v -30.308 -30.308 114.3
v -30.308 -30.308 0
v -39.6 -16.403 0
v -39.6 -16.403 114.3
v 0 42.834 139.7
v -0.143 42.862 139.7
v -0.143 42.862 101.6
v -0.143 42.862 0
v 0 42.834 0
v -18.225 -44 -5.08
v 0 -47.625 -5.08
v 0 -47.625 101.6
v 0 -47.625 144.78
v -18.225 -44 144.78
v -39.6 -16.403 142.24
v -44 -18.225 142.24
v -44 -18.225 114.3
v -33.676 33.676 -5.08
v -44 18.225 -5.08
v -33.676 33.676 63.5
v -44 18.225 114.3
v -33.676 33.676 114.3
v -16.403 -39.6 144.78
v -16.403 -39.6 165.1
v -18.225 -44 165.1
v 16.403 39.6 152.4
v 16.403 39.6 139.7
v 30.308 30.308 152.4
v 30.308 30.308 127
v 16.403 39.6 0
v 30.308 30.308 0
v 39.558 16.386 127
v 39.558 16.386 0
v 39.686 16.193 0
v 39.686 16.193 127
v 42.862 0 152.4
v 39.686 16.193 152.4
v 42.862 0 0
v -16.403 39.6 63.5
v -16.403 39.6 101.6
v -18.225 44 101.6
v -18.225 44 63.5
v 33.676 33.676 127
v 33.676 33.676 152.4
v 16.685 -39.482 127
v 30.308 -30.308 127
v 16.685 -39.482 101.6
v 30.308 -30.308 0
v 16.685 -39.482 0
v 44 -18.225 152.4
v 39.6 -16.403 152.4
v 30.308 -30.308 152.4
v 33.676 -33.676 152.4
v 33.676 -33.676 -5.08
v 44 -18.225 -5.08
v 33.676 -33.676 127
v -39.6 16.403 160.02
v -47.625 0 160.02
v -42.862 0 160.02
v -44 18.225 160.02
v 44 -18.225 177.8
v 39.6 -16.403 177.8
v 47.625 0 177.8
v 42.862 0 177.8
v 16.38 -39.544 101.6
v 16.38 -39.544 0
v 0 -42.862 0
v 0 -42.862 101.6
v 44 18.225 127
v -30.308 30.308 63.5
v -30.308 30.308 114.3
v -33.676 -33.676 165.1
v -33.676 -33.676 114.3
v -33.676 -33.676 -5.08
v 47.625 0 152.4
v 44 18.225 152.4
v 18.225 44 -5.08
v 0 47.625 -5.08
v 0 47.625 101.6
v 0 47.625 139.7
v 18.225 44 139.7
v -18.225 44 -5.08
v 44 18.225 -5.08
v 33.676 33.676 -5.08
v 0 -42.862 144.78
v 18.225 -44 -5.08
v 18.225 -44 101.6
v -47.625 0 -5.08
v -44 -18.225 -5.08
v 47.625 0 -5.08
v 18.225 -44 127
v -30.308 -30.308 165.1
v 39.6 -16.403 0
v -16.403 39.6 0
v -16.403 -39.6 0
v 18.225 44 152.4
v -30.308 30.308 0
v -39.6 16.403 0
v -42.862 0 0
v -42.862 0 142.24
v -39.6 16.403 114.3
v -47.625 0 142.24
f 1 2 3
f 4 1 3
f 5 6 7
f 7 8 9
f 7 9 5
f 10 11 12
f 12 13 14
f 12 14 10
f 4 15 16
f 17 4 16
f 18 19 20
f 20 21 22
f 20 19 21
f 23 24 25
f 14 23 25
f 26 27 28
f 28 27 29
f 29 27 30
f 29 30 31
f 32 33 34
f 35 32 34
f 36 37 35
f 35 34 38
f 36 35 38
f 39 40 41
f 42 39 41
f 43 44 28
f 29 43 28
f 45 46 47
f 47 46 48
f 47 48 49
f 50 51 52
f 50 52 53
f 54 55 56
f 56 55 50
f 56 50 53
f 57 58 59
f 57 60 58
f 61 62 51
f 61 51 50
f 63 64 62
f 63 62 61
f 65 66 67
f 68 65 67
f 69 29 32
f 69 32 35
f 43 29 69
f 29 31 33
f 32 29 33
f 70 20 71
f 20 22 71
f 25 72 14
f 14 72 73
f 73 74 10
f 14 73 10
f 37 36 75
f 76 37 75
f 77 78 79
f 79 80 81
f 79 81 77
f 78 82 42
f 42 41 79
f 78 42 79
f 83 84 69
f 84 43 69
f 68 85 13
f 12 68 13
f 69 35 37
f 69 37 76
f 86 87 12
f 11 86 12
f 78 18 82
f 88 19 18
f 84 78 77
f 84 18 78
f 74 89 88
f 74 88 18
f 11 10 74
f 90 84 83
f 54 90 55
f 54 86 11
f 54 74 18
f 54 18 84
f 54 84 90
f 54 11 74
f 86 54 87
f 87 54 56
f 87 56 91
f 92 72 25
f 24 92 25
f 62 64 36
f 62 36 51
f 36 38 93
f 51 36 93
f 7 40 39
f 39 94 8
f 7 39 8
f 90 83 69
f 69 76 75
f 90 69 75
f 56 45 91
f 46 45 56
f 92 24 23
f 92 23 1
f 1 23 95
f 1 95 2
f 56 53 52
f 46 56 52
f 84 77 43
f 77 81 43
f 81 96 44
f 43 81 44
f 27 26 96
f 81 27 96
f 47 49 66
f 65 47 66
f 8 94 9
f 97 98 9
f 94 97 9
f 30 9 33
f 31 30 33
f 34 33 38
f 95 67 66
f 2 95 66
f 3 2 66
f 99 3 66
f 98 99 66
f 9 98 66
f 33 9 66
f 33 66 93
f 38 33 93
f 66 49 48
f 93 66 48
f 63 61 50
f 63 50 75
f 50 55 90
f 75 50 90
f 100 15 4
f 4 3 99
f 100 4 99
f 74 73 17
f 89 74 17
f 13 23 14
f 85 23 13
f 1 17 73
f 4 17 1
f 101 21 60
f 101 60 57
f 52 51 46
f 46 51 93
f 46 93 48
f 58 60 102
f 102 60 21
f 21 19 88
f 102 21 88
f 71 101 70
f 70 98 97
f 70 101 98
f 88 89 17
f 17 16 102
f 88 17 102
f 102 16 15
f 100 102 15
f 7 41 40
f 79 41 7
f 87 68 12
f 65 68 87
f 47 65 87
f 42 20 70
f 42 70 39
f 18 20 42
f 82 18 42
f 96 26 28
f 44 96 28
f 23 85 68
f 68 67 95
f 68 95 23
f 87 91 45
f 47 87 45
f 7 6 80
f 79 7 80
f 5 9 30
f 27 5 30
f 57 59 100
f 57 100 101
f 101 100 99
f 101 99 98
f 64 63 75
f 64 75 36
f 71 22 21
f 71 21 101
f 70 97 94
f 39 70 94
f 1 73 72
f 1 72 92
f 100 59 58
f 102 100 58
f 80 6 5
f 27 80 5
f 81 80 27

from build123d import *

# Parameters (mm, degrees)
F1_DEPTH  = 152.4
F3_DEPTH  = 25.4
F5_DEPTH  = 50.8
F7_DEPTH  = 12.7
F9_DEPTH  = 63.5
F11_DEPTH = 38.1
F13_DEPTH = 10.16
F15_DEPTH = 5.08
F17_DEPTH = 38.1
F18_DEPTH = 25.4
F20_DEPTH = 7.62
F22_DEPTH = 50.8
F24_DEPTH = 25.4
F26_DEPTH = 25.4
F27_DEPTH = 12.7
F28_DEPTH = 7.62


with BuildPart() as f1:
    # F0 (on Top) → F1 (new body)
    with BuildSketch(Plane.XY):
        Polygon((-0.1432745452, 42.8622605407), (0, 42.8340103128), (0, 47.625), (-18.2252984664, 43.9997627359), (-16.4027686197, 39.5997864623), align=None)
        Polygon((16.3795251941, -39.5436718688), (0, -42.8625), (0, -47.625), (18.2252984664, -43.9997627359), align=None)
        Polygon((-39.5997864623, -16.4027686197), (-42.8625, 0), (-47.625, 0), (-43.9997627359, -18.2252984664), align=None)
        Polygon((39.6860263374, 16.1929990982), (42.8625, 0), (47.625, 0), (43.9997627359, 18.2252984664), (39.5581280192, 16.3855131276), align=None)
        Polygon((39.5997864623, -16.4027686197), (30.3083644086, -30.3083644086), (33.675960454, -33.675960454), (43.9997627359, -18.2252984664), align=None)
        Polygon((-39.5997864623, 16.4027686197), (-30.3083644086, 30.3083644086), (-33.675960454, 33.675960454), (-43.9997627359, 18.2252984664), align=None)
        Polygon((-16.4027686197, -39.5997864623), (-30.3083644086, -30.3083644086), (-33.675960454, -33.675960454), (-18.2252984664, -43.9997627359), align=None)
        Polygon((16.4027686197, 39.5997864623), (30.3083644086, 30.3083644086), (33.675960454, 33.675960454), (18.2252984664, 43.9997627359), align=None)
        Polygon((0, -47.625), (0, -42.8625), (-16.4027686197, -39.5997864623), (-18.2252984664, -43.9997627359), align=None)
        Polygon((0, 47.625), (0, 42.8340103128), (16.4027686197, 39.5997864623), (18.2252984664, 43.9997627359), align=None)
        Polygon((-33.675960454, -33.675960454), (-30.3083644086, -30.3083644086), (-39.5997864623, -16.4027686197), (-43.9997627359, -18.2252984664), align=None)
        Polygon((33.675960454, 33.675960454), (30.3083644086, 30.3083644086), (39.5581280192, 16.3855131276), (43.9997627359, 18.2252984664), align=None)
        Polygon((33.675960454, -33.675960454), (30.3083644086, -30.3083644086), (16.684655354, -39.481846233), (16.3795251941, -39.5436718688), (18.2252984664, -43.9997627359), align=None)
        Polygon((-33.675960454, 33.675960454), (-30.3083644086, 30.3083644086), (-16.4027686197, 39.5997864623), (-18.2252984664, 43.9997627359), align=None)
        Polygon((-47.625, 0), (-42.8625, 0), (-39.5997864623, 16.4027686197), (-43.9997627359, 18.2252984664), align=None)
        Polygon((47.625, 0), (42.8625, 0), (39.5997864623, -16.4027686197), (43.9997627359, -18.2252984664), align=None)
    extrude(amount=F1_DEPTH)

    # F2 (on face) → F3 (cut)
    with BuildSketch(Plane.XY.offset(152.4)):
        Polygon((39.6860263374, 16.1929990982), (43.9997627359, 18.2252984664), (33.675960454, 33.675960454), (30.3083644086, 30.3083644086), align=None)
    extrude(amount=-F3_DEPTH, mode=Mode.SUBTRACT)

    # F4 (on face) → F5 (cut)
    with BuildSketch(Plane.XY.offset(152.4)):
        Polygon((-0.1432745452, 42.8622605407), (0, 47.625), (-18.2252984664, 43.9997627359), (-16.4027686197, 39.5997864623), align=None)
    extrude(amount=-F5_DEPTH, mode=Mode.SUBTRACT)

    # F6 (on face) → F7 (cut)
    with BuildSketch(Plane.XY.offset(152.4)):
        Polygon((16.4027686197, 39.5997864623), (18.2252984664, 43.9997627359), (0, 47.625), (-0.1432745452, 42.8622605407), align=None)
    extrude(amount=-F7_DEPTH, mode=Mode.SUBTRACT)

    # F8 (on face) → F9 (cut)
    with BuildSketch(Plane.XY.offset(152.4)):
        Polygon((-18.2252984664, 43.9997627359), (-33.675960454, 33.675960454), (-30.3083644086, 30.3083644086), (-16.4027686197, 39.5997864623), align=None)
    extrude(amount=-F9_DEPTH, mode=Mode.SUBTRACT)

    # F10 (on face) → F11 (cut)
    with BuildSketch(Plane.XY.offset(152.4)):
        Polygon((-33.675960454, 33.675960454), (-43.9997627359, 18.2252984664), (-39.5997864623, 16.4027686197), (-30.3083644086, 30.3083644086), align=None)
    extrude(amount=-F11_DEPTH, mode=Mode.SUBTRACT)

    # F12 (on face) → F13 (cut)
    with BuildSketch(Plane.XY.offset(152.4)):
        Polygon((-42.8625, 0), (-47.625, 0), (-43.9997627359, -18.2252984664), (-39.5997864623, -16.4027686197), align=None)
    extrude(amount=-F13_DEPTH, mode=Mode.SUBTRACT)

    # F14 (on face) → F15 (join)
    with BuildSketch(Plane(origin=(0, 0, 0), x_dir=(1, 0, 0), z_dir=(0, 0, -1))):
        Polygon((-18.2252984664, -43.9997627359), (0, -47.625), (18.2252984664, -43.9997627359), (33.675960454, -33.675960454), (43.9997627359, -18.2252984664), (47.625, 0), (43.9997627359, 18.2252984664), (33.675960454, 33.675960454), (18.2252984664, 43.9997627359), (0, 47.625), (-18.2252984664, 43.9997627359), (-33.675960454, 33.675960454), (-43.9997627359, 18.2252984664), (-47.625, 0), (-43.9997627359, -18.2252984664), (-33.675960454, -33.675960454), align=None)
        Polygon((30.3083644086, -30.3083644086), (16.4027686197, -39.5997864623), (-0.1432745452, -42.8622605407), (-16.4027686197, -39.5997864623), (-30.3083644086, -30.3083644086), (-39.5997864623, -16.4027686197), (-42.8625, 0), (-39.5997864623, 16.4027686197), (-30.3083644086, 30.3083644086), (-16.4027686197, 39.5997864623), (0, 42.8625), (16.684655354, 39.481846233), (30.3083644086, 30.3083644086), (39.5997864623, 16.4027686197), (42.8625, 0), (39.6860263374, -16.1929990982), align=None, mode=Mode.SUBTRACT)
        Polygon((-0.1432745452, -42.8622605407), (16.4027686197, -39.5997864623), (30.3083644086, -30.3083644086), (39.6860263374, -16.1929990982), (42.8625, 0), (39.5997864623, 16.4027686197), (30.3083644086, 30.3083644086), (16.684655354, 39.481846233), (0, 42.8625), (-16.4027686197, 39.5997864623), (-30.3083644086, 30.3083644086), (-39.5997864623, 16.4027686197), (-42.8625, 0), (-39.5997864623, -16.4027686197), (-30.3083644086, -30.3083644086), (-16.4027686197, -39.5997864623), align=None)
    extrude(amount=F15_DEPTH)

    # F16 (on face) → F17 (cut)
    with BuildSketch(Plane.XY.offset(152.4)):
        Polygon((-33.675960454, -33.675960454), (-30.3083644086, -30.3083644086), (-39.5997864623, -16.4027686197), (-43.9997627359, -18.2252984664), align=None)
    extrude(amount=-F17_DEPTH, mode=Mode.SUBTRACT)

    # F18 (cut): a face of the model
    f18_faces = [f1.faces().sort_by_distance(p)[0] for p in [
        (-24.6758616972, 36.9300368148, 88.9),
    ]]
    extrude(f18_faces, amount=-F18_DEPTH, mode=Mode.SUBTRACT)

    # F19 (on face) → F20 (cut)
    with BuildSketch(Plane.XY.offset(152.4)):
        Polygon((-16.4027686197, -39.5997864623), (-18.2252984664, -43.9997627359), (0, -47.625), (0, -42.8625), align=None)
    extrude(amount=-F20_DEPTH, mode=Mode.SUBTRACT)

    # F21 (on face) → F22 (cut)
    with BuildSketch(Plane.XY.offset(152.4)):
        Polygon((0, -47.625), (18.2252984664, -43.9997627359), (16.684655354, -39.481846233), (0, -42.8625), align=None)
    extrude(amount=-F22_DEPTH, mode=Mode.SUBTRACT)

    # F23 (on face) → F24 (cut)
    with BuildSketch(Plane.XY.offset(152.4)):
        Polygon((18.2252984664, -43.9997627359), (33.675960454, -33.675960454), (30.3083644086, -30.3083644086), (16.684655354, -39.481846233), align=None)
    extrude(amount=-F24_DEPTH, mode=Mode.SUBTRACT)

    # F25 (on face) → F26 (join)
    with BuildSketch(Plane.XY.offset(152.4)):
        Polygon((43.9997627359, -18.2252984664), (47.625, 0), (42.8625, 0), (39.5997864623, -16.4027686197), align=None)
    extrude(amount=F26_DEPTH)

    # F27 (add): a face of the model
    f27_faces = [f1.faces().sort_by_distance(p)[0] for p in [
        (-24.6758616972, -36.9300368148, 152.4),
    ]]
    extrude(f27_faces, amount=F27_DEPTH)

    # F28 (add): a face of the model
    f28_faces = [f1.faces().sort_by_distance(p)[0] for p in [
        (-43.561948599, 8.6650103235, 152.4),
    ]]
    extrude(f28_faces, amount=F28_DEPTH)


solid = f1.part
